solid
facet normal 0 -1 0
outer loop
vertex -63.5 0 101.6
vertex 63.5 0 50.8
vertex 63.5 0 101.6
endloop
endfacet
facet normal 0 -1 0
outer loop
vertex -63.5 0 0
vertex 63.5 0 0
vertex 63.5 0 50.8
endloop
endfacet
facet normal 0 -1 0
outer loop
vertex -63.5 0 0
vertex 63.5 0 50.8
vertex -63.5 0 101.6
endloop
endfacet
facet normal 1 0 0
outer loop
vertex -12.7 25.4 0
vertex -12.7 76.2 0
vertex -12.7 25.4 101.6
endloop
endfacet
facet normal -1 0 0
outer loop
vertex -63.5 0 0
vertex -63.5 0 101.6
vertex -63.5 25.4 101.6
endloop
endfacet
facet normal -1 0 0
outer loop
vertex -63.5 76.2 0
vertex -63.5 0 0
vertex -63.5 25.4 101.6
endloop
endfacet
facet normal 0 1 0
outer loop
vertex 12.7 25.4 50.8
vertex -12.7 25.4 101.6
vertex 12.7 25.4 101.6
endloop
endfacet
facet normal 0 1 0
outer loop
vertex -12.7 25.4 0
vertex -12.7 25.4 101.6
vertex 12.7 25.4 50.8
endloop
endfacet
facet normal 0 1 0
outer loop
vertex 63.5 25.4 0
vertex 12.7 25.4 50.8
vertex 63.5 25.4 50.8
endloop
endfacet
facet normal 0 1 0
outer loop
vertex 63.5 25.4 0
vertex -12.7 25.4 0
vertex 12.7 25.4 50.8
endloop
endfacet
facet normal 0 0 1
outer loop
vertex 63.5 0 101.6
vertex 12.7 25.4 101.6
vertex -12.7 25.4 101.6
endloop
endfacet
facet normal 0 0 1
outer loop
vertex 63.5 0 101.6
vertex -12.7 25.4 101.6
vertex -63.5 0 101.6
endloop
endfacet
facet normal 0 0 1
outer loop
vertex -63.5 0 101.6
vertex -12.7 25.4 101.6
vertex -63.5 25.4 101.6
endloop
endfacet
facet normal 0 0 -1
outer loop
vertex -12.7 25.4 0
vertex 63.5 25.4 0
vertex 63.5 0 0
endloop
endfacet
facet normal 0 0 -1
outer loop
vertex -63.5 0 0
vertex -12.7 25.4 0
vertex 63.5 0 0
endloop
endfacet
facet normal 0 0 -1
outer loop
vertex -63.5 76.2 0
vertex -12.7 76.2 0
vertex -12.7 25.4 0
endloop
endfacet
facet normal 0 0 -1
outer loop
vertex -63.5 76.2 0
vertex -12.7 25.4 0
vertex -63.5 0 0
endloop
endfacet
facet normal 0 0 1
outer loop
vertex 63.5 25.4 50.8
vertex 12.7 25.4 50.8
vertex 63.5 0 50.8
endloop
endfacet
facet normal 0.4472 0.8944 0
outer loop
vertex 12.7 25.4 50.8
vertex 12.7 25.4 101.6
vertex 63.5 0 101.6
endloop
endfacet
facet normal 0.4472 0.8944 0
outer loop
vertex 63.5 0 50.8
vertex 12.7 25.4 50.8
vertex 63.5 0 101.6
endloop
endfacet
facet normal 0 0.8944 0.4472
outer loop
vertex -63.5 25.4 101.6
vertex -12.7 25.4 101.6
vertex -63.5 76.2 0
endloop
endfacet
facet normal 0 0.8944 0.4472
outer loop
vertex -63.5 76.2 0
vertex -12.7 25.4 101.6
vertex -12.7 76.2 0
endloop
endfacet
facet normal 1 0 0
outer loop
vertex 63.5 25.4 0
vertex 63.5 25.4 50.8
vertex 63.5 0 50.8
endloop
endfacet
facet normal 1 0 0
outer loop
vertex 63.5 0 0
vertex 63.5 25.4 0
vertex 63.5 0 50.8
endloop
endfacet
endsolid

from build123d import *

# Parameters (mm, degrees)
BOSS_EXTRUDE1_DEPTH     = 101.6
CUT_EXTRUDE2_DEPTH      = 77.2
CUT_EXTRUDE2_DEPTH_BACK = 51.8
CUT_EXTRUDE6_DEPTH      = 50.8


with BuildPart() as part:
    # Sketch1 → Boss-Extrude1 (new body)
    with BuildSketch(Plane.XY):
        Polygon((-63.5, 76.2), (-12.7, 76.2), (-12.7, 25.4), (63.5, 25.4), (63.5, 0), (-63.5, 0), align=None)
    extrude(amount=BOSS_EXTRUDE1_DEPTH)

    # Sketch2 → Cut-Extrude2 (cut, two sides)
    with BuildSketch(Plane(origin=(-12.7, 0, 0), x_dir=(0, 0, -1), z_dir=(1, 0, 0))) as cut_extrude2_sk:
        Polygon((236.128778424, 194.264389212), (0, 76.2), (-101.6, 25.4), (-337.728778424, -92.664389212), (-573.857556848, 379.593167636), (0, 666.52194606), align=None)
    extrude(amount=CUT_EXTRUDE2_DEPTH, mode=Mode.SUBTRACT)
    extrude(cut_extrude2_sk.sketch, amount=-CUT_EXTRUDE2_DEPTH_BACK, mode=Mode.SUBTRACT)

    # Sketch3 → Cut-Extrude6 (cut)
    with BuildSketch(Plane.XY.offset(101.6)):
        Polygon((63.5, 25.4), (12.7, 25.4), (63.5, 0), align=None)
    extrude(amount=-CUT_EXTRUDE6_DEPTH, mode=Mode.SUBTRACT)


solid = part.part
